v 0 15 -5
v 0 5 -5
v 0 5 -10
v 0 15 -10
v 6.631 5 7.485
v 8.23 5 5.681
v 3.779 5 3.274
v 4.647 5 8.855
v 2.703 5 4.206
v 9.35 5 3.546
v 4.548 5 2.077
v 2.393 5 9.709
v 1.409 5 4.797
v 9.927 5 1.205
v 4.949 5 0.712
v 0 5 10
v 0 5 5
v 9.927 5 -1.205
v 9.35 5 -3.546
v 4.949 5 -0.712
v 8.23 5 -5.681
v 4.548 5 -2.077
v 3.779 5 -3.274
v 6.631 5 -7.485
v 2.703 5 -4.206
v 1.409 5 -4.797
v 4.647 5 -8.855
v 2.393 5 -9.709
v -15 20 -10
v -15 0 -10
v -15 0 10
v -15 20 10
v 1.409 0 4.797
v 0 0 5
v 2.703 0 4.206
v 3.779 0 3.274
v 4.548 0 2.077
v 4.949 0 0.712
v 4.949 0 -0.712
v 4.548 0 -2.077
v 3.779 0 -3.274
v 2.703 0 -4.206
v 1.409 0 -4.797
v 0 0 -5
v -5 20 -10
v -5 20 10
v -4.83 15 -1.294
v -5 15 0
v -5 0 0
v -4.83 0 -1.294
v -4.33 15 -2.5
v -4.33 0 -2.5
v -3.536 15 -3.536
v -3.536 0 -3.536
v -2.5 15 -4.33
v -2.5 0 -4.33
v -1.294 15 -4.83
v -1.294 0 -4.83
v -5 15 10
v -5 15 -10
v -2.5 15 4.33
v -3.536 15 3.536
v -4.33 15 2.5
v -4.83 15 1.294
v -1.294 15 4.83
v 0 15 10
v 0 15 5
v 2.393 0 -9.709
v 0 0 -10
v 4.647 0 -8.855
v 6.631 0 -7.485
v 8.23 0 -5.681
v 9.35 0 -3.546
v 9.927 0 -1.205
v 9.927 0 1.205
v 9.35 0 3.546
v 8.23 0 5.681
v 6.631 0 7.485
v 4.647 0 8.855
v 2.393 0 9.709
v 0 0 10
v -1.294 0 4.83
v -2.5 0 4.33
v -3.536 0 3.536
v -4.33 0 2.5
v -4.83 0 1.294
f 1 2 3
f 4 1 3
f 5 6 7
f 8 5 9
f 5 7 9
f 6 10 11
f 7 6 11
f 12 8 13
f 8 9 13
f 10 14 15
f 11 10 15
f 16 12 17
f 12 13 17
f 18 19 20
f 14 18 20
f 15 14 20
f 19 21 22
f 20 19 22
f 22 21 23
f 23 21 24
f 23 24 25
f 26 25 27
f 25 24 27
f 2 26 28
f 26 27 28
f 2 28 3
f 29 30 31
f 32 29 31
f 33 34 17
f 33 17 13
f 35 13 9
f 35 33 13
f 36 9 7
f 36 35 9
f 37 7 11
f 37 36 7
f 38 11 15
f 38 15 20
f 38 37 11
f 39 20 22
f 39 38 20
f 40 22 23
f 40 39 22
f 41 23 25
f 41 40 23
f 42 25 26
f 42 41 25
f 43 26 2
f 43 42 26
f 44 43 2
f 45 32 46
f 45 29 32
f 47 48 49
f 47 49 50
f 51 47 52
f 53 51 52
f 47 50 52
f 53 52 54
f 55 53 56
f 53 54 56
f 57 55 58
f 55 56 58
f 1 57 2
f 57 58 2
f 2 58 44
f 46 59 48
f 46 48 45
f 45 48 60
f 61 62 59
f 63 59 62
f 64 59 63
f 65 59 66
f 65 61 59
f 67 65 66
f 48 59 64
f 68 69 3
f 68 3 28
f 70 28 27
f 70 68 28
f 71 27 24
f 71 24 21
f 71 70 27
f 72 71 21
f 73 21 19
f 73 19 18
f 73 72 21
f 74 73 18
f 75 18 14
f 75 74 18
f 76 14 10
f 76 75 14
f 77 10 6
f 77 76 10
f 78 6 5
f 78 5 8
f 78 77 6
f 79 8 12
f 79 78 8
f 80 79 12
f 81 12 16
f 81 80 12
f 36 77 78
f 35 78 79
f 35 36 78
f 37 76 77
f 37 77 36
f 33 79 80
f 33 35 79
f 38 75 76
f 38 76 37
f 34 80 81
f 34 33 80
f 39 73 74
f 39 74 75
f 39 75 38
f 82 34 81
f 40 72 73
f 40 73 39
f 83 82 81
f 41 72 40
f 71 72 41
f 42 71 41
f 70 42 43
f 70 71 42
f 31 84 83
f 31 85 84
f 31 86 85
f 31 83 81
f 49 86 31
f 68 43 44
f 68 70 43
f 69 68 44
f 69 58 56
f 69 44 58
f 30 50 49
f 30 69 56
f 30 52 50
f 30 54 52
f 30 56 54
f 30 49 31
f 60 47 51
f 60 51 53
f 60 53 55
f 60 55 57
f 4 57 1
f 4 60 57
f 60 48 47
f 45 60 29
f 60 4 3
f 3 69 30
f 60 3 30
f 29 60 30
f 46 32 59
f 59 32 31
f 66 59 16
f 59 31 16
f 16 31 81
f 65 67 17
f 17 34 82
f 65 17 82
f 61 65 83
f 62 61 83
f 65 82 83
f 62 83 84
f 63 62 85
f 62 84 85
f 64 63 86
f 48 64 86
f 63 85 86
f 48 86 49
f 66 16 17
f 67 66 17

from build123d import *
from build123d.topology import SkipClean

# Parameters (mm, degrees)
SKETCH_1_R      = 5.000000000000002
EXTRUDE_2_DEPTH = 5
EXTRUDE_4_DEPTH = 15
EXTRUDE_5_DEPTH = 20


with BuildPart() as part:
    # 草圖1 → 填料-伸長2 (new body)
    with BuildSketch(Plane(origin=(0, 0, 0), x_dir=(1, 0, 0), z_dir=(0, 1, 0))):
        with BuildLine():
            Line((-15, -10.000000000000002), (0, -10))
            ThreePointArc((0, -10), (10, 2.8e-16), (1.22e-15, 10))
            Line((4.1e-16, 10), (-15, 10))
            Line((-15, 9.999999999999998), (-15, -10.000000000000002))
        make_face()
        Circle(SKETCH_1_R, mode=Mode.SUBTRACT)
    extrude(amount=EXTRUDE_2_DEPTH)

    # 草圖1<4> → 填料-伸長4 (add)
    with BuildSketch(Plane(origin=(0, 0, 0), x_dir=(1, 0, 0), z_dir=(0, 1, 0))):
        with BuildLine():
            Line((-15, -10.000000000000002), (0, -10))
            Line((0, -10), (0, -5))
            ThreePointArc((0, -5), (-5, -3.1e-16), (-6.1e-16, 5))
            Line((0, 5), (0, 10))
            Line((4.1e-16, 10), (-15, 10))
            Line((-15, 9.999999999999998), (-15, -10.000000000000002))
        make_face()
    extrude(amount=EXTRUDE_4_DEPTH)

    # 草圖1<5> → 填料-伸長5 (add)
    with SkipClean():  # the faces are left unmerged after this step: merging them gives an invalid solid
        with BuildSketch(Plane(origin=(0, 0, 0), x_dir=(1, 0, 0), z_dir=(0, 1, 0))):
            Polygon((-15, -10.000000000000002), (-5, -10), (-5, -3.55e-15), (-5, 10), (-15, 10), align=None)
        extrude(amount=EXTRUDE_5_DEPTH)


solid = part.part
